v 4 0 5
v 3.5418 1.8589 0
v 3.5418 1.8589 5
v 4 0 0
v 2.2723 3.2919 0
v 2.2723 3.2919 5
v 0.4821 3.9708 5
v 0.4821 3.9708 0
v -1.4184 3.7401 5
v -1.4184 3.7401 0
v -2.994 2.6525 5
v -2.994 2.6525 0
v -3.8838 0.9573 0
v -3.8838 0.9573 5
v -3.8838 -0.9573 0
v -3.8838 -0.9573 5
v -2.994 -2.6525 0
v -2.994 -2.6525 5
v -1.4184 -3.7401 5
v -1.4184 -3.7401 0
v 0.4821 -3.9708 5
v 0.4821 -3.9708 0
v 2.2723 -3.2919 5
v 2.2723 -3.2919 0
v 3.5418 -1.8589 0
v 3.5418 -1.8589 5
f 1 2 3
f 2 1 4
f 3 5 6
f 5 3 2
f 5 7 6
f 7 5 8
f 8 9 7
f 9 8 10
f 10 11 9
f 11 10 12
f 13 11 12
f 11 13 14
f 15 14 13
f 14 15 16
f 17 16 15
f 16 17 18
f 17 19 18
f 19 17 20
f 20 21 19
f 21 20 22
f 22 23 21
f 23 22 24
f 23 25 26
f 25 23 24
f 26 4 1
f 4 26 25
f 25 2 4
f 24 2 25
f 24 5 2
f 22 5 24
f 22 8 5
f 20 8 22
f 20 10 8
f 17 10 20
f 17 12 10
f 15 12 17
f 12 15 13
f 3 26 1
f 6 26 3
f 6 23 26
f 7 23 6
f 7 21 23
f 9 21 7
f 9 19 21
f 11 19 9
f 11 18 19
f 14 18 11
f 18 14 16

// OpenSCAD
// Generated by generate_scads.py
cylinder(h=5, r=4, center=false);
